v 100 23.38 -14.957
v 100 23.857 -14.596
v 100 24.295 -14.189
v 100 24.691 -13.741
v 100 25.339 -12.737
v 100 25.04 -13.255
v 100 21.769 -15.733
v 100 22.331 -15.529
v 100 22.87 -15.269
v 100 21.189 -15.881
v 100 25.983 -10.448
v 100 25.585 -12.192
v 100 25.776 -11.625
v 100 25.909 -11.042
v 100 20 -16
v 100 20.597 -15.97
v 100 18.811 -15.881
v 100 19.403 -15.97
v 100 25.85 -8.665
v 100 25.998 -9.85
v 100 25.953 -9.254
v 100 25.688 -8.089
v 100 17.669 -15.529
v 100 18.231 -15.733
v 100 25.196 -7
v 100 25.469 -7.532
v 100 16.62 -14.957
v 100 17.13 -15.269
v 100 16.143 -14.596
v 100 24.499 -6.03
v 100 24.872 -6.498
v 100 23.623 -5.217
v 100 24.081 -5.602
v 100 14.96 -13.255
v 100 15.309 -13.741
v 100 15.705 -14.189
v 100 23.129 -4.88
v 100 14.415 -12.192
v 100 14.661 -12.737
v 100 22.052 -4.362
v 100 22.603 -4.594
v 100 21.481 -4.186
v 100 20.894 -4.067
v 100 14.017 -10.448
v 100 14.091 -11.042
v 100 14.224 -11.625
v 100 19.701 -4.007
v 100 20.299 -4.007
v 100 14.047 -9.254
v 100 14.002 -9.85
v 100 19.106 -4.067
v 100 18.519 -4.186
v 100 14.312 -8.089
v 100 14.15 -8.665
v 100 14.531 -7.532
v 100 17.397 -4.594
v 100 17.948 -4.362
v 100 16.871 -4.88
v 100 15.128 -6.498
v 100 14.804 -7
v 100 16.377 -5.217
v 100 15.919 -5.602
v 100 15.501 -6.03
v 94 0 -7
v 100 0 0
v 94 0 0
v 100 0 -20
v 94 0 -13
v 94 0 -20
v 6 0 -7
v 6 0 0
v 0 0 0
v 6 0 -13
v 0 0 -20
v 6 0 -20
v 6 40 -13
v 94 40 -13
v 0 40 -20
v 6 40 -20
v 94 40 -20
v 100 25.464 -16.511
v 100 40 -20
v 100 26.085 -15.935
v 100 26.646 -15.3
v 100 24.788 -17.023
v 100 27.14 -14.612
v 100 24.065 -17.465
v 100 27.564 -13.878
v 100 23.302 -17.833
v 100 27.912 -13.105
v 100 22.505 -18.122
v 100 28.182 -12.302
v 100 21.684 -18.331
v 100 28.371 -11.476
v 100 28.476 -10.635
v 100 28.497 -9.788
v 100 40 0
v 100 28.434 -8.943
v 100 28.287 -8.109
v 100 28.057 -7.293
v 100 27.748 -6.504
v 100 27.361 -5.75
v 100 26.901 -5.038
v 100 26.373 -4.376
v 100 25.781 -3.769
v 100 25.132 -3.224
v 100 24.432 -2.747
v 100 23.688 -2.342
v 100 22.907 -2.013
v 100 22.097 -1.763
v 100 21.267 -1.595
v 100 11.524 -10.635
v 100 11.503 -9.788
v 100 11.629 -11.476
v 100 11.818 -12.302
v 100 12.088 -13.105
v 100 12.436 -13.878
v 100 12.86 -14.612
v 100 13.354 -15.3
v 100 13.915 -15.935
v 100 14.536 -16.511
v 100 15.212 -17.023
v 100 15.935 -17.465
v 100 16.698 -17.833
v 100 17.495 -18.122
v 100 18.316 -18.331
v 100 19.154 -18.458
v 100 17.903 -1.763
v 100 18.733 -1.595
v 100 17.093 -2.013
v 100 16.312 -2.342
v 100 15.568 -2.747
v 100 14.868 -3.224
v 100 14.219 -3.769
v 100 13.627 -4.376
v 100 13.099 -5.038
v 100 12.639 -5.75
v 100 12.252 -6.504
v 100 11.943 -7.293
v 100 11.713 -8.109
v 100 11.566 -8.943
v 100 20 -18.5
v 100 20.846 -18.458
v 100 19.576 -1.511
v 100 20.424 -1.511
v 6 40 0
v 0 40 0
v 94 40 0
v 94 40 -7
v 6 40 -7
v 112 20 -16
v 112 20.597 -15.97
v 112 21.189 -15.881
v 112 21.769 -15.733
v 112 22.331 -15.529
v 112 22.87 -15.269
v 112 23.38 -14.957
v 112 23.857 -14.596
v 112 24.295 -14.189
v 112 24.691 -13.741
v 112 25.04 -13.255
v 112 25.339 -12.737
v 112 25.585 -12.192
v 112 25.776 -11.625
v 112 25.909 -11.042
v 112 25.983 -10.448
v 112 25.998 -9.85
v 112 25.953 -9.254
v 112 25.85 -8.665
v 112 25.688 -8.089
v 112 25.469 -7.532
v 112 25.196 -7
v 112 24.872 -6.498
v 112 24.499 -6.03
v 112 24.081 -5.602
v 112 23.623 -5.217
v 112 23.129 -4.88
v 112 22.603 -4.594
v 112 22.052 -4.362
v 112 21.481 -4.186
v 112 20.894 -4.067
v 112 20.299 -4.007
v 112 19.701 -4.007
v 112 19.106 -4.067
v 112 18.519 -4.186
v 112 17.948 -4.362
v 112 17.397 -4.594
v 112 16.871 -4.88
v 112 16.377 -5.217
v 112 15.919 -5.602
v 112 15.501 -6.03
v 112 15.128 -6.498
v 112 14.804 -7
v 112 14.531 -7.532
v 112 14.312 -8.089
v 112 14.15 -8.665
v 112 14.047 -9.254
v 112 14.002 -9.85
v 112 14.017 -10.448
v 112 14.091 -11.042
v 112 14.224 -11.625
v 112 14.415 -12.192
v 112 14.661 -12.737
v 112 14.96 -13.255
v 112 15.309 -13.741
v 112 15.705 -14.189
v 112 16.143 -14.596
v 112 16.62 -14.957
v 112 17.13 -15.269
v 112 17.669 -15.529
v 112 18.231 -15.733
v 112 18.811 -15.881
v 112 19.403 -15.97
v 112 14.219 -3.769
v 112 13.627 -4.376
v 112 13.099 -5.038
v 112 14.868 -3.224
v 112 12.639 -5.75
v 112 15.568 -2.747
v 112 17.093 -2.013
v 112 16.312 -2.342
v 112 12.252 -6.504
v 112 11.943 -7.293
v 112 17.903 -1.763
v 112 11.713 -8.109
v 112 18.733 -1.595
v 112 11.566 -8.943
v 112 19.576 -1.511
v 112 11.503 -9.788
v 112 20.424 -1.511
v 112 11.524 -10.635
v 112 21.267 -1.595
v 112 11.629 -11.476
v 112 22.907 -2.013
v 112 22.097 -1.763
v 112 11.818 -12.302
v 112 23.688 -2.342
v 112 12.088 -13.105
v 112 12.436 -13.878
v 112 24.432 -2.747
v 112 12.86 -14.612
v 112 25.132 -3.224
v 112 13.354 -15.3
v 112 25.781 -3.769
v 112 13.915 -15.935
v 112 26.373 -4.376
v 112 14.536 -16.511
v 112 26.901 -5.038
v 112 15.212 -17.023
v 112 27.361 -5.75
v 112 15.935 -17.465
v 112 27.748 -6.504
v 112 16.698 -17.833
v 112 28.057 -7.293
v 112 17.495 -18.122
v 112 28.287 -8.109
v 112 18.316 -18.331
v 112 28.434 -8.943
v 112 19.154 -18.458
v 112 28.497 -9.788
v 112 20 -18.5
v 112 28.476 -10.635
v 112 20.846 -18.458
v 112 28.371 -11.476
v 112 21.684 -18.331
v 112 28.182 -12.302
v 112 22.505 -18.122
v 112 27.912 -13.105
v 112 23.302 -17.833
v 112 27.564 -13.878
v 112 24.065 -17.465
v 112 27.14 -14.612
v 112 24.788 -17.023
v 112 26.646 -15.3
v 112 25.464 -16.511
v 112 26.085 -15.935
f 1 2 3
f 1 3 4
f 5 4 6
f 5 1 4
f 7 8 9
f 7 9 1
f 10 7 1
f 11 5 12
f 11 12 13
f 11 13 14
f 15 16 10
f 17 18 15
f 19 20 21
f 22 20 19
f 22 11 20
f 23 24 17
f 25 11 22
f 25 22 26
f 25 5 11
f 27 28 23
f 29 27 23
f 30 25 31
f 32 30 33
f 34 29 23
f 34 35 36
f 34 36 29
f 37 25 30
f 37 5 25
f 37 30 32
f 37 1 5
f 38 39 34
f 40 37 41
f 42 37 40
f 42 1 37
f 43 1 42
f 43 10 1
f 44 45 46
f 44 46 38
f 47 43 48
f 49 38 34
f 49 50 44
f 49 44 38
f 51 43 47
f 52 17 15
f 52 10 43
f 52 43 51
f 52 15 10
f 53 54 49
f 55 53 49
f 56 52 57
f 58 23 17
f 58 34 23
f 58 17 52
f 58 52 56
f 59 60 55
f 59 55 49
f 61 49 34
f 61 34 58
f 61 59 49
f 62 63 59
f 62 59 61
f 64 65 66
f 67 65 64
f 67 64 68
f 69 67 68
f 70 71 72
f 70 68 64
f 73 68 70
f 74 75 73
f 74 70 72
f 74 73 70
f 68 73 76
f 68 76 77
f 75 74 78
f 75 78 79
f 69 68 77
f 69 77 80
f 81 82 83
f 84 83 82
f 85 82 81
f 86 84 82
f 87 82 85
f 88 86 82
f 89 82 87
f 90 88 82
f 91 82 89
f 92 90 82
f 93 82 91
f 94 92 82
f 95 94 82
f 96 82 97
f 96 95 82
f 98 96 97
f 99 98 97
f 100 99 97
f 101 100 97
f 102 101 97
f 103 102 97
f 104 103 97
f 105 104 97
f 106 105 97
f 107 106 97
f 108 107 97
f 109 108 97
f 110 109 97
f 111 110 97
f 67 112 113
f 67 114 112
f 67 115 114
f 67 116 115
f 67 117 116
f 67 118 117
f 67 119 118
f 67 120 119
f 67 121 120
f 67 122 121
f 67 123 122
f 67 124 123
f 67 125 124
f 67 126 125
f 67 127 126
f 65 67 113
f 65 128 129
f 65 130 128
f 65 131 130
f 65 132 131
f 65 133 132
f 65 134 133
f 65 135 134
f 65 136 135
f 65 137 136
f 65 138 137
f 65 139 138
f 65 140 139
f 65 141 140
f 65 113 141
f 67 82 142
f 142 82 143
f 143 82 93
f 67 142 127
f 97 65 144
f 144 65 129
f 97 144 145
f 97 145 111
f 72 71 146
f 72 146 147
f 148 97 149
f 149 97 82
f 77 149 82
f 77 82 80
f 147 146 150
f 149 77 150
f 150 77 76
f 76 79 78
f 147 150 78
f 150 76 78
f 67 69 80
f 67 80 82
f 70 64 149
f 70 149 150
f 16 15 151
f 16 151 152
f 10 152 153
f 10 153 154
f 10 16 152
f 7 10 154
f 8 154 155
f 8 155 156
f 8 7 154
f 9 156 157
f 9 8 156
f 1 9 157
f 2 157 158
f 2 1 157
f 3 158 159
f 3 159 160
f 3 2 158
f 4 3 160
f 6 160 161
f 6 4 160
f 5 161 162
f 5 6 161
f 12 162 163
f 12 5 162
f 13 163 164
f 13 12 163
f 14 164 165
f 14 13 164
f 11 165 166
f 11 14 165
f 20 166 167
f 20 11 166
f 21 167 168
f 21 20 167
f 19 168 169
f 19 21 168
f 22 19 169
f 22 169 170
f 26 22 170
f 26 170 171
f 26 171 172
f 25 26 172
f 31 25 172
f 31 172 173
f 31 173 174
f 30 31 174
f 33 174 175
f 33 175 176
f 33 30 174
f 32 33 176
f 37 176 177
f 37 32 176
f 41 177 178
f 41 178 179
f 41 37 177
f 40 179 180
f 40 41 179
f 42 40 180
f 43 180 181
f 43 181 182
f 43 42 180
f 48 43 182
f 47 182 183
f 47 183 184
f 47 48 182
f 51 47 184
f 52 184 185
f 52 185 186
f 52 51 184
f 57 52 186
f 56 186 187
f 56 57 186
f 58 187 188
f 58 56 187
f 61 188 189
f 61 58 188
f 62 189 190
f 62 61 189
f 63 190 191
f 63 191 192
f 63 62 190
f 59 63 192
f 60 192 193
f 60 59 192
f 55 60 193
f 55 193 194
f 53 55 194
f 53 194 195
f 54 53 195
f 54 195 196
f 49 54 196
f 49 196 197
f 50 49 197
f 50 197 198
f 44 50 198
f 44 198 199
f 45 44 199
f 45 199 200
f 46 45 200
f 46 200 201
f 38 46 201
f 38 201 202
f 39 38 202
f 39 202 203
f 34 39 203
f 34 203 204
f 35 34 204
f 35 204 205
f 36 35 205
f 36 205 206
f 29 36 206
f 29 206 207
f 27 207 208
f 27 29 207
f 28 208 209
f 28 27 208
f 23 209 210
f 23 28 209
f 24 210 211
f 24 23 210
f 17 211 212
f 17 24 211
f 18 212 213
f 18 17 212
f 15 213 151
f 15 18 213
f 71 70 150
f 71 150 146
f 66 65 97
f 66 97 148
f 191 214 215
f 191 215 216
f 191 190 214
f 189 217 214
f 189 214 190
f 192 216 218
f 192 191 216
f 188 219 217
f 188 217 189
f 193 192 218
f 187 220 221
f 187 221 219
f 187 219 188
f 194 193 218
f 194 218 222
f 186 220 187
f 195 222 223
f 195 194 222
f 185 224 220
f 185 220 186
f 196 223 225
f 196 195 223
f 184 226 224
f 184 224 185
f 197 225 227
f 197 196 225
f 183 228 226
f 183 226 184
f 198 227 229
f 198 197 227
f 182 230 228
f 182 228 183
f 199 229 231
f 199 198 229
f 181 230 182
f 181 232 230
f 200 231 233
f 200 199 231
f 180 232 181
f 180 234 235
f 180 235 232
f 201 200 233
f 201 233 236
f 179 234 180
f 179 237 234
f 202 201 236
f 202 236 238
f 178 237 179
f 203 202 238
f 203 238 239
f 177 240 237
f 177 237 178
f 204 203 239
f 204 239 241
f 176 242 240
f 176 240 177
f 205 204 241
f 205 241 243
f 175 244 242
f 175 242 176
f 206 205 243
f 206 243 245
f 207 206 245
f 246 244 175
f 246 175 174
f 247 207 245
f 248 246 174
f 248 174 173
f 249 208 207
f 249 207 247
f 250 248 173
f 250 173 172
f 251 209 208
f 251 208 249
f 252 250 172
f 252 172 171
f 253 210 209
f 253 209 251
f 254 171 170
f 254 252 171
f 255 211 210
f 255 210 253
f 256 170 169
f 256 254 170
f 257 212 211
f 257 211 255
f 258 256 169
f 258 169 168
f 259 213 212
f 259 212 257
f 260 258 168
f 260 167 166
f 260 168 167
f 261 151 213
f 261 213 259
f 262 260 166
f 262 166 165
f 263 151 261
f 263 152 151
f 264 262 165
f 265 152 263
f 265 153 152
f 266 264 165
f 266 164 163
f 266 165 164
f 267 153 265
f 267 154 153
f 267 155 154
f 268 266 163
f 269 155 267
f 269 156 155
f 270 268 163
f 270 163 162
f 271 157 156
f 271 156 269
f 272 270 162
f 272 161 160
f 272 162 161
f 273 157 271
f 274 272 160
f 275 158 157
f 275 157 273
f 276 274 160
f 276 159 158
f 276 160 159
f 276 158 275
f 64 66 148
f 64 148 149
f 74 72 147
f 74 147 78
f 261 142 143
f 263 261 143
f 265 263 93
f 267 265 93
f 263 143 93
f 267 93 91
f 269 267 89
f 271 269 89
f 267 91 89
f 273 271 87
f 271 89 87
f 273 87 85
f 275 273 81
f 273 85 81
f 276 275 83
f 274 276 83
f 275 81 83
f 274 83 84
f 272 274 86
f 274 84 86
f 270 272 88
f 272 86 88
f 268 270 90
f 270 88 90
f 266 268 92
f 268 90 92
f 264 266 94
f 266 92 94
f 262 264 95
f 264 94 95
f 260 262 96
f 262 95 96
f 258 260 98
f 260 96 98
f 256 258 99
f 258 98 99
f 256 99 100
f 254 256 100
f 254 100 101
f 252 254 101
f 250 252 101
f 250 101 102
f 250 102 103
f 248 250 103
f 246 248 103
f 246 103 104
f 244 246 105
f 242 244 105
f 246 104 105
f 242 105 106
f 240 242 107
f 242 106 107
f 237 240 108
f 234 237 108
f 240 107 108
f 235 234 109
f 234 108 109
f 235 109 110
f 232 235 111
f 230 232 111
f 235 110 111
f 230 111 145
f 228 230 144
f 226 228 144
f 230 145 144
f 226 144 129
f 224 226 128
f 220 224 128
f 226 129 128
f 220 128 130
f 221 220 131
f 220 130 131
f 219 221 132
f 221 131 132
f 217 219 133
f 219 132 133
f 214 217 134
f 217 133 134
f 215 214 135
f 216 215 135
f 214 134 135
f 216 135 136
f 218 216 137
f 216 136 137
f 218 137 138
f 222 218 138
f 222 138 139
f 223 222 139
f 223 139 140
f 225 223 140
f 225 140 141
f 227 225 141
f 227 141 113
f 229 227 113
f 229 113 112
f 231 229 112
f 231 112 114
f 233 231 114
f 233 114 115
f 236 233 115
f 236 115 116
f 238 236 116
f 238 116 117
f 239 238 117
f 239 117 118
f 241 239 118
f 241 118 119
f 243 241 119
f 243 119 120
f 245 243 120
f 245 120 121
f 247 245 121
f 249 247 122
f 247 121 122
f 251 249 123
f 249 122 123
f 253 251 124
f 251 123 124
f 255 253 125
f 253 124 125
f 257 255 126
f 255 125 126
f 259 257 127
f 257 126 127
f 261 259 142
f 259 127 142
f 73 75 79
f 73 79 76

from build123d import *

# Parameters (mm, degrees)
BODY_DEPTH   = 40
SKETCH2_R    = 8.5
SKETCH2_R_2  = 6
NOZZLE_DEPTH = 12


with BuildPart() as part:
    # Sketch1 → Body (new body)
    with BuildSketch(Plane(origin=(0, 0, 0), x_dir=(1, 0, 0), z_dir=(0, 1, 0))):
        Polygon((0, 0), (0, 20), (6, 20), (6, 13), (94, 13), (94, 20), (100, 20), (100, 0), (94, 0), (94, 7), (6, 7), (6, 0), align=None)
    extrude(amount=BODY_DEPTH)

    # Sketch2 → Nozzle (add)
    with BuildSketch(Plane(origin=(100, 0, 0), x_dir=(0, 0, -1), z_dir=(1, 0, 0))):
        with Locations((10, 20)):
            Circle(SKETCH2_R)
        with Locations((10, 20)):
            Circle(SKETCH2_R_2, mode=Mode.SUBTRACT)
    extrude(amount=NOZZLE_DEPTH)


solid = part.part
